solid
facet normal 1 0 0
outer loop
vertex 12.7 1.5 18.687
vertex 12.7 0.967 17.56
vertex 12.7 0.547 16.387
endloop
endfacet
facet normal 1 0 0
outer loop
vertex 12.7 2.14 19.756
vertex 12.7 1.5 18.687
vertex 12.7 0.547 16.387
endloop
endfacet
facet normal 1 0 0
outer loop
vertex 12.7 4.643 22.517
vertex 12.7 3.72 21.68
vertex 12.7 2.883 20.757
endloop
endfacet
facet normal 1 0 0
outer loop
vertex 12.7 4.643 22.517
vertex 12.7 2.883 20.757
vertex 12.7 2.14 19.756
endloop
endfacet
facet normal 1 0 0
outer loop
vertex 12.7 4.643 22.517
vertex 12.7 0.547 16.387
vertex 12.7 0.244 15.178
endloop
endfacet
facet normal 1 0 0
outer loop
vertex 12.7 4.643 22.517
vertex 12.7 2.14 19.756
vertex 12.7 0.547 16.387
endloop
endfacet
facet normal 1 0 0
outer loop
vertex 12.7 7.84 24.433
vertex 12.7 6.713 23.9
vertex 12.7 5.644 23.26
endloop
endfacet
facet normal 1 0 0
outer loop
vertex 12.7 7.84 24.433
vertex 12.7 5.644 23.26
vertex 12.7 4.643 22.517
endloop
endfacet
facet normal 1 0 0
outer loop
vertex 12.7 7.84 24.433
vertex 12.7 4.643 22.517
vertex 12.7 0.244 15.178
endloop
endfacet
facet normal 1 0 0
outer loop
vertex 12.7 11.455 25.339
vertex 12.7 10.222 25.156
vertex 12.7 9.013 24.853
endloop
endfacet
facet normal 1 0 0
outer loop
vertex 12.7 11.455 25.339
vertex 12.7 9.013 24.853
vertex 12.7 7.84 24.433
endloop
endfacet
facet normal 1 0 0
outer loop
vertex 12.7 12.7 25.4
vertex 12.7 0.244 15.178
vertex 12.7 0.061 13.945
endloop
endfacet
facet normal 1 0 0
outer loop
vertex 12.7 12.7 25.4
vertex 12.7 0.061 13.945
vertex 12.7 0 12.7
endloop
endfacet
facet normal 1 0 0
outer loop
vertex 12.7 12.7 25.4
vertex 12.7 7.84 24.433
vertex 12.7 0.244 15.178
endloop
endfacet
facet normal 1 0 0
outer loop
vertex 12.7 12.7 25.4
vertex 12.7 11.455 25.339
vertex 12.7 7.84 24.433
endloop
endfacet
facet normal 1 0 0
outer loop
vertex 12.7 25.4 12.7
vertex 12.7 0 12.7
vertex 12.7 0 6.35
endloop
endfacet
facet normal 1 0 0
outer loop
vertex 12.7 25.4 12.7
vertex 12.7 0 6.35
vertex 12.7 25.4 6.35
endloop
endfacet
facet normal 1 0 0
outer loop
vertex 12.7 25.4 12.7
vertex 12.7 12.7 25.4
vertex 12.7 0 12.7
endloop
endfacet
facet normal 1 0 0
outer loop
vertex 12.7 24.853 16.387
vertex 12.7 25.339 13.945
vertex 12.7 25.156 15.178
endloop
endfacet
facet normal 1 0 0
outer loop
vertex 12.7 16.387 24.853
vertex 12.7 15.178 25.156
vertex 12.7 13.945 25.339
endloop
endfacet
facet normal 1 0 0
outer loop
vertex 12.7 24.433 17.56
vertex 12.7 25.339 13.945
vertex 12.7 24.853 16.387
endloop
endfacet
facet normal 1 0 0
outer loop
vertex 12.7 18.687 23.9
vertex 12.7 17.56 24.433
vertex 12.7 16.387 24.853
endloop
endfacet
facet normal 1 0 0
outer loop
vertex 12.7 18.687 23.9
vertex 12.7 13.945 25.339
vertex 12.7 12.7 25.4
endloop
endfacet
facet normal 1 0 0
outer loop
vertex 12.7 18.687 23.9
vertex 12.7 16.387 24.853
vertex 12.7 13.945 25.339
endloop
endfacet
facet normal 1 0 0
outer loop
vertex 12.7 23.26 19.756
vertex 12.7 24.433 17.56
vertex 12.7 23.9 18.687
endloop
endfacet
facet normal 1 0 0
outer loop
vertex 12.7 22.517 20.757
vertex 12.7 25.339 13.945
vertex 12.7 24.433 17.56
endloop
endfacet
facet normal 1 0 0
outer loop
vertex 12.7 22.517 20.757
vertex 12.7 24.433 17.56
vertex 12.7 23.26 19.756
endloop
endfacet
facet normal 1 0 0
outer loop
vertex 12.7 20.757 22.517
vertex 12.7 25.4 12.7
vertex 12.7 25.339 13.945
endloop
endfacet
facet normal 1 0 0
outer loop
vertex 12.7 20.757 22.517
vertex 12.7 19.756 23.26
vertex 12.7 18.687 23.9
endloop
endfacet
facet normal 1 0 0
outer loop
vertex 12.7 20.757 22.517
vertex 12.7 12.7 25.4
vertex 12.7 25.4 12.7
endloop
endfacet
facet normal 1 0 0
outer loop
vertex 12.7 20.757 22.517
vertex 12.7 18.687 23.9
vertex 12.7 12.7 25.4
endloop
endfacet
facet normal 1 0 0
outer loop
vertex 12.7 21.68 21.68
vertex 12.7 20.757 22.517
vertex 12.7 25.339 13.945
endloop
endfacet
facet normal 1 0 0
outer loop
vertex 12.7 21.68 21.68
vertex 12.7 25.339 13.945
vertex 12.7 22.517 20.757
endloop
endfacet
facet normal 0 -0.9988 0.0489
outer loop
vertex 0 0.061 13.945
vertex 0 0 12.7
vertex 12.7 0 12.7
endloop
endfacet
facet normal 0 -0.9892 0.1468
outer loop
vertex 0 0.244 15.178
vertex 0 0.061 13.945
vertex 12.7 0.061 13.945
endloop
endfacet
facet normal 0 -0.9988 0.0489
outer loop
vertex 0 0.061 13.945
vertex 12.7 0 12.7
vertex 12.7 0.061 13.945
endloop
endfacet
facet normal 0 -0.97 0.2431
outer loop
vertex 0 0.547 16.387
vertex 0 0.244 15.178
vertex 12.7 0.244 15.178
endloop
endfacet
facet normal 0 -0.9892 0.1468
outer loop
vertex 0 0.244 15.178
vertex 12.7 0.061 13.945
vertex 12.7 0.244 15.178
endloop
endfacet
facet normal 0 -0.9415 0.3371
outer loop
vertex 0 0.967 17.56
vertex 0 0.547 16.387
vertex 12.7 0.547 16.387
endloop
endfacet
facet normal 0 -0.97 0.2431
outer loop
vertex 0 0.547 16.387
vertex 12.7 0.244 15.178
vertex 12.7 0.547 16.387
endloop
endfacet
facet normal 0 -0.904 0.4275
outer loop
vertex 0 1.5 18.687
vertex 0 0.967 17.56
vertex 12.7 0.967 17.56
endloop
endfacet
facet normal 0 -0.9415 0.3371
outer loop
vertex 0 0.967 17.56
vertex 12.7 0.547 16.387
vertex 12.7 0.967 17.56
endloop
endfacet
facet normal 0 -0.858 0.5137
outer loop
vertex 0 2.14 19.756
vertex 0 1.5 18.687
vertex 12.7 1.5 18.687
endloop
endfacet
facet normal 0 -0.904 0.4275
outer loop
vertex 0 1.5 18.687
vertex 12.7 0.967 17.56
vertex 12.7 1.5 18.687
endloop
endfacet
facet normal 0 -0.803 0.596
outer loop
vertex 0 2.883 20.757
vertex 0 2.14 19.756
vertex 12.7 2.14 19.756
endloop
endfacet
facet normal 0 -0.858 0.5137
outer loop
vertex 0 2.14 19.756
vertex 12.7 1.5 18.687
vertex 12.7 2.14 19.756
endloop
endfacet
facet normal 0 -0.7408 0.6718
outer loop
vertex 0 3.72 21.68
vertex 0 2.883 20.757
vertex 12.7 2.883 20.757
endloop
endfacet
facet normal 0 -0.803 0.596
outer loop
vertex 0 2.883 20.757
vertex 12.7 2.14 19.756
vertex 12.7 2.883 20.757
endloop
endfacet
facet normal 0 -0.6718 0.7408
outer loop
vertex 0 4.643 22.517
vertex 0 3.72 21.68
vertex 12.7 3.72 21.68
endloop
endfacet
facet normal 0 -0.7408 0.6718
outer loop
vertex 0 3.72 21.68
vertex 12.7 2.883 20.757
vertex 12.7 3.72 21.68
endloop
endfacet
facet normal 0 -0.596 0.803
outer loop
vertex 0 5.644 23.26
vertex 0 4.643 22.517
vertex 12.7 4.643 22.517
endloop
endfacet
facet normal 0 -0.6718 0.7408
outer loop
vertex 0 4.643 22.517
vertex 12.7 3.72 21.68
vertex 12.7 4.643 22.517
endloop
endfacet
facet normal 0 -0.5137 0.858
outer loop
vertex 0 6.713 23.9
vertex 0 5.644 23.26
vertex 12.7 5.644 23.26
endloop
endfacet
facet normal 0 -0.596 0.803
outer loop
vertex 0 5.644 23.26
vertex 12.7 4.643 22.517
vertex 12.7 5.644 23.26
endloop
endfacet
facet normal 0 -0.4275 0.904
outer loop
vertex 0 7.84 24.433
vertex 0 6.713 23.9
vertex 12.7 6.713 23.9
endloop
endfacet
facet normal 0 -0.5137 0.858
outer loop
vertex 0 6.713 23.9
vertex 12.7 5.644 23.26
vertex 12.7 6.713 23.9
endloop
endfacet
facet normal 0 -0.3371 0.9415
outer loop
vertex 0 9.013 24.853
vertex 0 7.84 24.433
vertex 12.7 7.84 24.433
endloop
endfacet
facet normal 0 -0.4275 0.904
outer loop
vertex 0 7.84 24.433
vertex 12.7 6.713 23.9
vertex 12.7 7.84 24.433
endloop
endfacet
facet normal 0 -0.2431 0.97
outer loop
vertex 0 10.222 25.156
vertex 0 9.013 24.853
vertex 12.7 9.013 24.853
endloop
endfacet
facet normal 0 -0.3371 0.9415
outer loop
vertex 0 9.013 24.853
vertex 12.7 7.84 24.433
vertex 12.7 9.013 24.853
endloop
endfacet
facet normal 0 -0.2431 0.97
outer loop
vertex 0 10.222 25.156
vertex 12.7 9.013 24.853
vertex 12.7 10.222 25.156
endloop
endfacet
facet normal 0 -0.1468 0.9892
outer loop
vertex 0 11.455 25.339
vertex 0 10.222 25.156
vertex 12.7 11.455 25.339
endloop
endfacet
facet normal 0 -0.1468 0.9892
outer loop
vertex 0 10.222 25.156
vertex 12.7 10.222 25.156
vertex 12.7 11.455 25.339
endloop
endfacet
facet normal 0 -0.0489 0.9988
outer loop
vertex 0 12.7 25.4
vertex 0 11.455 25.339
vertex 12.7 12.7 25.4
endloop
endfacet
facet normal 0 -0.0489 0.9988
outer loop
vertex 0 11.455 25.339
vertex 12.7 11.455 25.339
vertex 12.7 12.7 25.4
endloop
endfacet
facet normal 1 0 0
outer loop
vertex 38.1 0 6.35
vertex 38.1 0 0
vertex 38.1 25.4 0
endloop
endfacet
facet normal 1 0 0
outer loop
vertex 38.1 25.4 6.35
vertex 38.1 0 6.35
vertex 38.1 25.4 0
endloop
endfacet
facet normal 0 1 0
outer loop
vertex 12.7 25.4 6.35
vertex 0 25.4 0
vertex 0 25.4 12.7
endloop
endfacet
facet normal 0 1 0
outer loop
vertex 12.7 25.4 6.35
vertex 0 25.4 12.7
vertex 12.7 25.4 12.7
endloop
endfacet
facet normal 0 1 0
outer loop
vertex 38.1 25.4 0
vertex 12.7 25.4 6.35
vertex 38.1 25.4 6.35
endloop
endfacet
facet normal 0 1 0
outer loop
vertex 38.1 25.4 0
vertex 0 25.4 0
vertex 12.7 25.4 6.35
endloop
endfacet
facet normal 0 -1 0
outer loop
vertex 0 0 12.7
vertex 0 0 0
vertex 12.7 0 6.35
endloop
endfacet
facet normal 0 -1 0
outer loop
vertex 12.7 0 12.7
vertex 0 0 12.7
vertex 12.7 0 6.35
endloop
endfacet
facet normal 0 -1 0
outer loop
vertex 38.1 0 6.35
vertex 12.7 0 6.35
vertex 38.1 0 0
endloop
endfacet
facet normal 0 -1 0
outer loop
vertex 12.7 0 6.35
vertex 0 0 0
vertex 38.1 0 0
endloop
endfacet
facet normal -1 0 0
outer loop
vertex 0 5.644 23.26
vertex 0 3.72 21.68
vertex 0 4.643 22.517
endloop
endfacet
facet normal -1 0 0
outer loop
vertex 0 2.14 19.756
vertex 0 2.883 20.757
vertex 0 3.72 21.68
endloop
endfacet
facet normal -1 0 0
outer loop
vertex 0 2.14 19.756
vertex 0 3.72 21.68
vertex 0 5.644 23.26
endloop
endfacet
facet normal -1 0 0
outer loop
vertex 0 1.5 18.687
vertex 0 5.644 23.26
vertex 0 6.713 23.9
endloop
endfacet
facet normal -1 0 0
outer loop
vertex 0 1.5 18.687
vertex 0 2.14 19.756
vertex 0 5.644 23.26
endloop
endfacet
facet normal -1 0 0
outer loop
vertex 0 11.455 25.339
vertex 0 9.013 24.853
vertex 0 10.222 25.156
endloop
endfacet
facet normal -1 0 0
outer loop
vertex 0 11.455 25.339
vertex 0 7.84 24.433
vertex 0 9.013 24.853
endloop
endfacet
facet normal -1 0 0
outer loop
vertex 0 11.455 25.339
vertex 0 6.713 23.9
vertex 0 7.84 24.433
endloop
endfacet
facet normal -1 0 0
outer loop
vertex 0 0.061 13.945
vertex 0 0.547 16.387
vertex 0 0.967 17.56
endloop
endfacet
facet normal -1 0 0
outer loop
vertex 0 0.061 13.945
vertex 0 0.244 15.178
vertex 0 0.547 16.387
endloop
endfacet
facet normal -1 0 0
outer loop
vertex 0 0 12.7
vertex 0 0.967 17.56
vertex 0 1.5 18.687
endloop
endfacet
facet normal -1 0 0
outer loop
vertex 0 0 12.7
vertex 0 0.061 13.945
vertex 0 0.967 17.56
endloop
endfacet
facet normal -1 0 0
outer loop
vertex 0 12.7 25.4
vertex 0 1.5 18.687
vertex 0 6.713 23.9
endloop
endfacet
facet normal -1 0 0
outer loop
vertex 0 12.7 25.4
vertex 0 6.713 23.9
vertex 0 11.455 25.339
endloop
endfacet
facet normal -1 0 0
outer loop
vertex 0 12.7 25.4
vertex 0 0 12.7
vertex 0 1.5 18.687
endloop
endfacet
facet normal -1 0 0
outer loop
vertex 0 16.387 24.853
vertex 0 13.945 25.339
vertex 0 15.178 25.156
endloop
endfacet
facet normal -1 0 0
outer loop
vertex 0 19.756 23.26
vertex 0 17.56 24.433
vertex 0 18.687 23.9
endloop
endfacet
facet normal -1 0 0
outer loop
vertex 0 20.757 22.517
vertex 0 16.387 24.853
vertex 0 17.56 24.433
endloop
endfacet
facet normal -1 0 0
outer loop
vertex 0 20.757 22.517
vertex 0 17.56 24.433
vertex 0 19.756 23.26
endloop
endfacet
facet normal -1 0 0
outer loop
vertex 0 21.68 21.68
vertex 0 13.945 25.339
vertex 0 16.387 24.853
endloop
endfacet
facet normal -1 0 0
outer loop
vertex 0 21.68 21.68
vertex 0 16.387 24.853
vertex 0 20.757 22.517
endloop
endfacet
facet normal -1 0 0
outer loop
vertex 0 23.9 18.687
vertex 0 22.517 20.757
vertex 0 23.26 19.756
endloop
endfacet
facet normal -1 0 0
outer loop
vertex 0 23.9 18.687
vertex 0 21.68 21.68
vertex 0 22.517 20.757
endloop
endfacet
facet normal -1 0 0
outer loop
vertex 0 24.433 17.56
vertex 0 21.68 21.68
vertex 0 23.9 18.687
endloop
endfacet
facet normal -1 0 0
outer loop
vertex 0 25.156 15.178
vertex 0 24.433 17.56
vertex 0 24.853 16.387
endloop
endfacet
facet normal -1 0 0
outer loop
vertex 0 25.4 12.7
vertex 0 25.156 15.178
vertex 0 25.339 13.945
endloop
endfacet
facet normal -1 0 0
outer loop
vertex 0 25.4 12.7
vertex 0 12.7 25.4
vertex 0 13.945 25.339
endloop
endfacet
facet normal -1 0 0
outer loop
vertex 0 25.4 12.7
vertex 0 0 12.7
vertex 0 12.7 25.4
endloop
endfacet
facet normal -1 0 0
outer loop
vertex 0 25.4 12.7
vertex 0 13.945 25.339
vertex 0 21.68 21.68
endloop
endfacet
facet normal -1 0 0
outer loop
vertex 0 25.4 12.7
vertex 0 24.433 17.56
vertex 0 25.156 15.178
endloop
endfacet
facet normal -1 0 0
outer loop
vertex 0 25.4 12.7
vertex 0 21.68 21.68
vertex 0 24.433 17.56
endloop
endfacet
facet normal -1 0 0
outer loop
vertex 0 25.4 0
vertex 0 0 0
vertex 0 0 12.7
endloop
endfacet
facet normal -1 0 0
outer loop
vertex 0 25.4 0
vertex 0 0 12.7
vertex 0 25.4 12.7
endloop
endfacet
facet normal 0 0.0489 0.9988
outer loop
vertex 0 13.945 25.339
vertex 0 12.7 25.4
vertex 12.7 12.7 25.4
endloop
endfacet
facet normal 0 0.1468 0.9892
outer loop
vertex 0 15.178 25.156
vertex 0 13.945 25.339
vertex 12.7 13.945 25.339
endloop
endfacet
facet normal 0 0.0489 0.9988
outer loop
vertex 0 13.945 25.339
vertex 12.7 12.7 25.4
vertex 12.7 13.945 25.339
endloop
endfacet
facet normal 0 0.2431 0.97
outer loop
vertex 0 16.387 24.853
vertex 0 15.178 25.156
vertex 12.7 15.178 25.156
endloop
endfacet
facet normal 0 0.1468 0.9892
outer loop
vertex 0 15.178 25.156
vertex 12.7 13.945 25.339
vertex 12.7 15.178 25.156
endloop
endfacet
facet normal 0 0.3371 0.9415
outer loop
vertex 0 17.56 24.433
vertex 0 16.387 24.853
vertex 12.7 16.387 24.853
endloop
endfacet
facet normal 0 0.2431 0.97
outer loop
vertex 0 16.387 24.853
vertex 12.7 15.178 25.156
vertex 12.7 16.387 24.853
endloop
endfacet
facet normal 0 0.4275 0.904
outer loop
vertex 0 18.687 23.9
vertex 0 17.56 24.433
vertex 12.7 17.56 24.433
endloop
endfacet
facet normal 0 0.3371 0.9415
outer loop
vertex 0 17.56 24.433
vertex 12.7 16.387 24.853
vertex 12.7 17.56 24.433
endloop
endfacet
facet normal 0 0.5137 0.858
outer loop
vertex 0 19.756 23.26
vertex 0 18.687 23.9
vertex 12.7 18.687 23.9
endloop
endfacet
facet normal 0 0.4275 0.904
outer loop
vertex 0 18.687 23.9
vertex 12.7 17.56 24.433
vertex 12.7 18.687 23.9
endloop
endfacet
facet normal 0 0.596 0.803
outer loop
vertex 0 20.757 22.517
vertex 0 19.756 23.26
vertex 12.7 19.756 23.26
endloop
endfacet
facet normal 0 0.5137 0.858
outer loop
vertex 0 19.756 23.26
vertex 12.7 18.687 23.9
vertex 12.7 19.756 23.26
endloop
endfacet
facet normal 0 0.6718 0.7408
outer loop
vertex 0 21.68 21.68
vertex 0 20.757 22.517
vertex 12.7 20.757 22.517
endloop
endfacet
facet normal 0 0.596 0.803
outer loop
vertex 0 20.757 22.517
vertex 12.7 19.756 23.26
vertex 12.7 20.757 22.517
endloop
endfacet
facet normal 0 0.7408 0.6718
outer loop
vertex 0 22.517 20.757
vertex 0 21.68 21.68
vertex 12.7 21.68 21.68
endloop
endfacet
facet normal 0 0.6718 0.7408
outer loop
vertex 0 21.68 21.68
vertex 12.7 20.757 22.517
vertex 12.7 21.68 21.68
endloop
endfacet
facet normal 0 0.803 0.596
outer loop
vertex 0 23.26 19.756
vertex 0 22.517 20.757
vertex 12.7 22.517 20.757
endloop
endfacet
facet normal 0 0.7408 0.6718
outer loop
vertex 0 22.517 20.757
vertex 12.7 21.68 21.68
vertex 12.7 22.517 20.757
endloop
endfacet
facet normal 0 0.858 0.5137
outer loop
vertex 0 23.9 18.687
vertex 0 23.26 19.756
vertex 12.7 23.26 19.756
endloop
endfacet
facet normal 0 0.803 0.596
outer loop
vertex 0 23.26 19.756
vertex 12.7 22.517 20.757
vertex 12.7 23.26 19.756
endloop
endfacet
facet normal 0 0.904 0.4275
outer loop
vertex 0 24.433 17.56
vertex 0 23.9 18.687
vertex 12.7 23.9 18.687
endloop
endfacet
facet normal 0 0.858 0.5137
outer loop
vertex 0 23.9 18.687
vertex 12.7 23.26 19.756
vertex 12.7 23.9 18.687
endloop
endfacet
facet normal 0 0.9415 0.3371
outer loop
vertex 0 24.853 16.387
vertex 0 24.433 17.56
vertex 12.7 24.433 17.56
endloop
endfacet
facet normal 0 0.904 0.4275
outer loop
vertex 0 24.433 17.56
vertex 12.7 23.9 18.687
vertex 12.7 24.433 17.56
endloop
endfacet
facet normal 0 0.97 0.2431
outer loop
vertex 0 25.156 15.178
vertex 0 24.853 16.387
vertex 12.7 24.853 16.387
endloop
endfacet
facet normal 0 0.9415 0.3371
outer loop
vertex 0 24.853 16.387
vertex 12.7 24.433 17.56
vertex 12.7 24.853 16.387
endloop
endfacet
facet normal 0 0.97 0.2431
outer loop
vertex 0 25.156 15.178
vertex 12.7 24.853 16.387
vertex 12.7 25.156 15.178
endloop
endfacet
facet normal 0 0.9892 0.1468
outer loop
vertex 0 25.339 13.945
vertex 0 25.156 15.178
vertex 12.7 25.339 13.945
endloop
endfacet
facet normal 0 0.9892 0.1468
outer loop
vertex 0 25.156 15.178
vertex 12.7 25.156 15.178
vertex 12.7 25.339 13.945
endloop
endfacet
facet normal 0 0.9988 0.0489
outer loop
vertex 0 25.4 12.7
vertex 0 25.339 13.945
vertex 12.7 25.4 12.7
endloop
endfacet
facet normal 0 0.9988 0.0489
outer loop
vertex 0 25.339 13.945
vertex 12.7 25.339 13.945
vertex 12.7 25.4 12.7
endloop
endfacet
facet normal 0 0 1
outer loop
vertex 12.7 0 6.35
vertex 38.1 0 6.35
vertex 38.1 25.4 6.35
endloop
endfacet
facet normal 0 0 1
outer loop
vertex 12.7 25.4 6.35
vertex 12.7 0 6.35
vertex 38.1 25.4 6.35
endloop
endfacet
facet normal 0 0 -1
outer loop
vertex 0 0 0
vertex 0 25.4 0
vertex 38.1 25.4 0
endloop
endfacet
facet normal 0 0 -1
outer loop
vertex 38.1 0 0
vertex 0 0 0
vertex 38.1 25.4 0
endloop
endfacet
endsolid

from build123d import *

# Parameters (mm, degrees)
F0_W     = 38.1
F0_H     = 25.4
F1_DEPTH = 25.4
F3_DEPTH = 38.101
F4_DEPTH = 38.101
F5_DEPTH = 25.4


with BuildPart() as f1:
    # F0 (on Top) → F1 (new body)
    with BuildSketch(Plane.XY):
        with Locations((19.05, 12.7)):
            Rectangle(F0_W, F0_H)
    extrude(amount=F1_DEPTH)

    # F2 (on face) → F3 (cut, through all)
    with BuildSketch(Plane.YZ.offset(38.1)):
        with BuildLine():
            ThreePointArc((12.7, 25.4), (21.6802561211, 21.6802561211), (25.4, 12.7))
            Line((25.4, 12.7), (25.4, 25.4))
            Line((25.4, 25.4), (12.7, 25.4))
        make_face()
        with BuildLine():
            ThreePointArc((0, 12.7), (3.7197438789, 21.6802561211), (12.7, 25.4))
            Line((12.7, 25.4), (0, 25.4))
            Line((0, 25.4), (0, 12.7))
        make_face()
    extrude(amount=-F3_DEPTH, mode=Mode.SUBTRACT)

    # F2 (on face) → F4 (cut, through all)
    with BuildSketch(Plane.YZ.offset(38.1)):
        with BuildLine():
            ThreePointArc((12.7, 25.4), (21.6802561211, 21.6802561211), (25.4, 12.7))
            Line((25.4, 12.7), (25.4, 25.4))
            Line((25.4, 25.4), (12.7, 25.4))
        make_face()
    extrude(amount=-F4_DEPTH, mode=Mode.SUBTRACT)

    # F2 (on face) → F5 (cut)
    with BuildSketch(Plane.YZ.offset(38.1)):
        with BuildLine():
            Line((25.4, 6.35), (25.4, 12.7))
            ThreePointArc((25.4, 12.7), (21.6802561211, 21.6802561211), (12.7, 25.4))
            ThreePointArc((12.7, 25.4), (3.7197438789, 21.6802561211), (0, 12.7))
            Line((0, 12.7), (0, 6.35))
            Line((0, 6.35), (25.4, 6.35))
        make_face()
    extrude(amount=-F5_DEPTH, mode=Mode.SUBTRACT)


solid = f1.part
